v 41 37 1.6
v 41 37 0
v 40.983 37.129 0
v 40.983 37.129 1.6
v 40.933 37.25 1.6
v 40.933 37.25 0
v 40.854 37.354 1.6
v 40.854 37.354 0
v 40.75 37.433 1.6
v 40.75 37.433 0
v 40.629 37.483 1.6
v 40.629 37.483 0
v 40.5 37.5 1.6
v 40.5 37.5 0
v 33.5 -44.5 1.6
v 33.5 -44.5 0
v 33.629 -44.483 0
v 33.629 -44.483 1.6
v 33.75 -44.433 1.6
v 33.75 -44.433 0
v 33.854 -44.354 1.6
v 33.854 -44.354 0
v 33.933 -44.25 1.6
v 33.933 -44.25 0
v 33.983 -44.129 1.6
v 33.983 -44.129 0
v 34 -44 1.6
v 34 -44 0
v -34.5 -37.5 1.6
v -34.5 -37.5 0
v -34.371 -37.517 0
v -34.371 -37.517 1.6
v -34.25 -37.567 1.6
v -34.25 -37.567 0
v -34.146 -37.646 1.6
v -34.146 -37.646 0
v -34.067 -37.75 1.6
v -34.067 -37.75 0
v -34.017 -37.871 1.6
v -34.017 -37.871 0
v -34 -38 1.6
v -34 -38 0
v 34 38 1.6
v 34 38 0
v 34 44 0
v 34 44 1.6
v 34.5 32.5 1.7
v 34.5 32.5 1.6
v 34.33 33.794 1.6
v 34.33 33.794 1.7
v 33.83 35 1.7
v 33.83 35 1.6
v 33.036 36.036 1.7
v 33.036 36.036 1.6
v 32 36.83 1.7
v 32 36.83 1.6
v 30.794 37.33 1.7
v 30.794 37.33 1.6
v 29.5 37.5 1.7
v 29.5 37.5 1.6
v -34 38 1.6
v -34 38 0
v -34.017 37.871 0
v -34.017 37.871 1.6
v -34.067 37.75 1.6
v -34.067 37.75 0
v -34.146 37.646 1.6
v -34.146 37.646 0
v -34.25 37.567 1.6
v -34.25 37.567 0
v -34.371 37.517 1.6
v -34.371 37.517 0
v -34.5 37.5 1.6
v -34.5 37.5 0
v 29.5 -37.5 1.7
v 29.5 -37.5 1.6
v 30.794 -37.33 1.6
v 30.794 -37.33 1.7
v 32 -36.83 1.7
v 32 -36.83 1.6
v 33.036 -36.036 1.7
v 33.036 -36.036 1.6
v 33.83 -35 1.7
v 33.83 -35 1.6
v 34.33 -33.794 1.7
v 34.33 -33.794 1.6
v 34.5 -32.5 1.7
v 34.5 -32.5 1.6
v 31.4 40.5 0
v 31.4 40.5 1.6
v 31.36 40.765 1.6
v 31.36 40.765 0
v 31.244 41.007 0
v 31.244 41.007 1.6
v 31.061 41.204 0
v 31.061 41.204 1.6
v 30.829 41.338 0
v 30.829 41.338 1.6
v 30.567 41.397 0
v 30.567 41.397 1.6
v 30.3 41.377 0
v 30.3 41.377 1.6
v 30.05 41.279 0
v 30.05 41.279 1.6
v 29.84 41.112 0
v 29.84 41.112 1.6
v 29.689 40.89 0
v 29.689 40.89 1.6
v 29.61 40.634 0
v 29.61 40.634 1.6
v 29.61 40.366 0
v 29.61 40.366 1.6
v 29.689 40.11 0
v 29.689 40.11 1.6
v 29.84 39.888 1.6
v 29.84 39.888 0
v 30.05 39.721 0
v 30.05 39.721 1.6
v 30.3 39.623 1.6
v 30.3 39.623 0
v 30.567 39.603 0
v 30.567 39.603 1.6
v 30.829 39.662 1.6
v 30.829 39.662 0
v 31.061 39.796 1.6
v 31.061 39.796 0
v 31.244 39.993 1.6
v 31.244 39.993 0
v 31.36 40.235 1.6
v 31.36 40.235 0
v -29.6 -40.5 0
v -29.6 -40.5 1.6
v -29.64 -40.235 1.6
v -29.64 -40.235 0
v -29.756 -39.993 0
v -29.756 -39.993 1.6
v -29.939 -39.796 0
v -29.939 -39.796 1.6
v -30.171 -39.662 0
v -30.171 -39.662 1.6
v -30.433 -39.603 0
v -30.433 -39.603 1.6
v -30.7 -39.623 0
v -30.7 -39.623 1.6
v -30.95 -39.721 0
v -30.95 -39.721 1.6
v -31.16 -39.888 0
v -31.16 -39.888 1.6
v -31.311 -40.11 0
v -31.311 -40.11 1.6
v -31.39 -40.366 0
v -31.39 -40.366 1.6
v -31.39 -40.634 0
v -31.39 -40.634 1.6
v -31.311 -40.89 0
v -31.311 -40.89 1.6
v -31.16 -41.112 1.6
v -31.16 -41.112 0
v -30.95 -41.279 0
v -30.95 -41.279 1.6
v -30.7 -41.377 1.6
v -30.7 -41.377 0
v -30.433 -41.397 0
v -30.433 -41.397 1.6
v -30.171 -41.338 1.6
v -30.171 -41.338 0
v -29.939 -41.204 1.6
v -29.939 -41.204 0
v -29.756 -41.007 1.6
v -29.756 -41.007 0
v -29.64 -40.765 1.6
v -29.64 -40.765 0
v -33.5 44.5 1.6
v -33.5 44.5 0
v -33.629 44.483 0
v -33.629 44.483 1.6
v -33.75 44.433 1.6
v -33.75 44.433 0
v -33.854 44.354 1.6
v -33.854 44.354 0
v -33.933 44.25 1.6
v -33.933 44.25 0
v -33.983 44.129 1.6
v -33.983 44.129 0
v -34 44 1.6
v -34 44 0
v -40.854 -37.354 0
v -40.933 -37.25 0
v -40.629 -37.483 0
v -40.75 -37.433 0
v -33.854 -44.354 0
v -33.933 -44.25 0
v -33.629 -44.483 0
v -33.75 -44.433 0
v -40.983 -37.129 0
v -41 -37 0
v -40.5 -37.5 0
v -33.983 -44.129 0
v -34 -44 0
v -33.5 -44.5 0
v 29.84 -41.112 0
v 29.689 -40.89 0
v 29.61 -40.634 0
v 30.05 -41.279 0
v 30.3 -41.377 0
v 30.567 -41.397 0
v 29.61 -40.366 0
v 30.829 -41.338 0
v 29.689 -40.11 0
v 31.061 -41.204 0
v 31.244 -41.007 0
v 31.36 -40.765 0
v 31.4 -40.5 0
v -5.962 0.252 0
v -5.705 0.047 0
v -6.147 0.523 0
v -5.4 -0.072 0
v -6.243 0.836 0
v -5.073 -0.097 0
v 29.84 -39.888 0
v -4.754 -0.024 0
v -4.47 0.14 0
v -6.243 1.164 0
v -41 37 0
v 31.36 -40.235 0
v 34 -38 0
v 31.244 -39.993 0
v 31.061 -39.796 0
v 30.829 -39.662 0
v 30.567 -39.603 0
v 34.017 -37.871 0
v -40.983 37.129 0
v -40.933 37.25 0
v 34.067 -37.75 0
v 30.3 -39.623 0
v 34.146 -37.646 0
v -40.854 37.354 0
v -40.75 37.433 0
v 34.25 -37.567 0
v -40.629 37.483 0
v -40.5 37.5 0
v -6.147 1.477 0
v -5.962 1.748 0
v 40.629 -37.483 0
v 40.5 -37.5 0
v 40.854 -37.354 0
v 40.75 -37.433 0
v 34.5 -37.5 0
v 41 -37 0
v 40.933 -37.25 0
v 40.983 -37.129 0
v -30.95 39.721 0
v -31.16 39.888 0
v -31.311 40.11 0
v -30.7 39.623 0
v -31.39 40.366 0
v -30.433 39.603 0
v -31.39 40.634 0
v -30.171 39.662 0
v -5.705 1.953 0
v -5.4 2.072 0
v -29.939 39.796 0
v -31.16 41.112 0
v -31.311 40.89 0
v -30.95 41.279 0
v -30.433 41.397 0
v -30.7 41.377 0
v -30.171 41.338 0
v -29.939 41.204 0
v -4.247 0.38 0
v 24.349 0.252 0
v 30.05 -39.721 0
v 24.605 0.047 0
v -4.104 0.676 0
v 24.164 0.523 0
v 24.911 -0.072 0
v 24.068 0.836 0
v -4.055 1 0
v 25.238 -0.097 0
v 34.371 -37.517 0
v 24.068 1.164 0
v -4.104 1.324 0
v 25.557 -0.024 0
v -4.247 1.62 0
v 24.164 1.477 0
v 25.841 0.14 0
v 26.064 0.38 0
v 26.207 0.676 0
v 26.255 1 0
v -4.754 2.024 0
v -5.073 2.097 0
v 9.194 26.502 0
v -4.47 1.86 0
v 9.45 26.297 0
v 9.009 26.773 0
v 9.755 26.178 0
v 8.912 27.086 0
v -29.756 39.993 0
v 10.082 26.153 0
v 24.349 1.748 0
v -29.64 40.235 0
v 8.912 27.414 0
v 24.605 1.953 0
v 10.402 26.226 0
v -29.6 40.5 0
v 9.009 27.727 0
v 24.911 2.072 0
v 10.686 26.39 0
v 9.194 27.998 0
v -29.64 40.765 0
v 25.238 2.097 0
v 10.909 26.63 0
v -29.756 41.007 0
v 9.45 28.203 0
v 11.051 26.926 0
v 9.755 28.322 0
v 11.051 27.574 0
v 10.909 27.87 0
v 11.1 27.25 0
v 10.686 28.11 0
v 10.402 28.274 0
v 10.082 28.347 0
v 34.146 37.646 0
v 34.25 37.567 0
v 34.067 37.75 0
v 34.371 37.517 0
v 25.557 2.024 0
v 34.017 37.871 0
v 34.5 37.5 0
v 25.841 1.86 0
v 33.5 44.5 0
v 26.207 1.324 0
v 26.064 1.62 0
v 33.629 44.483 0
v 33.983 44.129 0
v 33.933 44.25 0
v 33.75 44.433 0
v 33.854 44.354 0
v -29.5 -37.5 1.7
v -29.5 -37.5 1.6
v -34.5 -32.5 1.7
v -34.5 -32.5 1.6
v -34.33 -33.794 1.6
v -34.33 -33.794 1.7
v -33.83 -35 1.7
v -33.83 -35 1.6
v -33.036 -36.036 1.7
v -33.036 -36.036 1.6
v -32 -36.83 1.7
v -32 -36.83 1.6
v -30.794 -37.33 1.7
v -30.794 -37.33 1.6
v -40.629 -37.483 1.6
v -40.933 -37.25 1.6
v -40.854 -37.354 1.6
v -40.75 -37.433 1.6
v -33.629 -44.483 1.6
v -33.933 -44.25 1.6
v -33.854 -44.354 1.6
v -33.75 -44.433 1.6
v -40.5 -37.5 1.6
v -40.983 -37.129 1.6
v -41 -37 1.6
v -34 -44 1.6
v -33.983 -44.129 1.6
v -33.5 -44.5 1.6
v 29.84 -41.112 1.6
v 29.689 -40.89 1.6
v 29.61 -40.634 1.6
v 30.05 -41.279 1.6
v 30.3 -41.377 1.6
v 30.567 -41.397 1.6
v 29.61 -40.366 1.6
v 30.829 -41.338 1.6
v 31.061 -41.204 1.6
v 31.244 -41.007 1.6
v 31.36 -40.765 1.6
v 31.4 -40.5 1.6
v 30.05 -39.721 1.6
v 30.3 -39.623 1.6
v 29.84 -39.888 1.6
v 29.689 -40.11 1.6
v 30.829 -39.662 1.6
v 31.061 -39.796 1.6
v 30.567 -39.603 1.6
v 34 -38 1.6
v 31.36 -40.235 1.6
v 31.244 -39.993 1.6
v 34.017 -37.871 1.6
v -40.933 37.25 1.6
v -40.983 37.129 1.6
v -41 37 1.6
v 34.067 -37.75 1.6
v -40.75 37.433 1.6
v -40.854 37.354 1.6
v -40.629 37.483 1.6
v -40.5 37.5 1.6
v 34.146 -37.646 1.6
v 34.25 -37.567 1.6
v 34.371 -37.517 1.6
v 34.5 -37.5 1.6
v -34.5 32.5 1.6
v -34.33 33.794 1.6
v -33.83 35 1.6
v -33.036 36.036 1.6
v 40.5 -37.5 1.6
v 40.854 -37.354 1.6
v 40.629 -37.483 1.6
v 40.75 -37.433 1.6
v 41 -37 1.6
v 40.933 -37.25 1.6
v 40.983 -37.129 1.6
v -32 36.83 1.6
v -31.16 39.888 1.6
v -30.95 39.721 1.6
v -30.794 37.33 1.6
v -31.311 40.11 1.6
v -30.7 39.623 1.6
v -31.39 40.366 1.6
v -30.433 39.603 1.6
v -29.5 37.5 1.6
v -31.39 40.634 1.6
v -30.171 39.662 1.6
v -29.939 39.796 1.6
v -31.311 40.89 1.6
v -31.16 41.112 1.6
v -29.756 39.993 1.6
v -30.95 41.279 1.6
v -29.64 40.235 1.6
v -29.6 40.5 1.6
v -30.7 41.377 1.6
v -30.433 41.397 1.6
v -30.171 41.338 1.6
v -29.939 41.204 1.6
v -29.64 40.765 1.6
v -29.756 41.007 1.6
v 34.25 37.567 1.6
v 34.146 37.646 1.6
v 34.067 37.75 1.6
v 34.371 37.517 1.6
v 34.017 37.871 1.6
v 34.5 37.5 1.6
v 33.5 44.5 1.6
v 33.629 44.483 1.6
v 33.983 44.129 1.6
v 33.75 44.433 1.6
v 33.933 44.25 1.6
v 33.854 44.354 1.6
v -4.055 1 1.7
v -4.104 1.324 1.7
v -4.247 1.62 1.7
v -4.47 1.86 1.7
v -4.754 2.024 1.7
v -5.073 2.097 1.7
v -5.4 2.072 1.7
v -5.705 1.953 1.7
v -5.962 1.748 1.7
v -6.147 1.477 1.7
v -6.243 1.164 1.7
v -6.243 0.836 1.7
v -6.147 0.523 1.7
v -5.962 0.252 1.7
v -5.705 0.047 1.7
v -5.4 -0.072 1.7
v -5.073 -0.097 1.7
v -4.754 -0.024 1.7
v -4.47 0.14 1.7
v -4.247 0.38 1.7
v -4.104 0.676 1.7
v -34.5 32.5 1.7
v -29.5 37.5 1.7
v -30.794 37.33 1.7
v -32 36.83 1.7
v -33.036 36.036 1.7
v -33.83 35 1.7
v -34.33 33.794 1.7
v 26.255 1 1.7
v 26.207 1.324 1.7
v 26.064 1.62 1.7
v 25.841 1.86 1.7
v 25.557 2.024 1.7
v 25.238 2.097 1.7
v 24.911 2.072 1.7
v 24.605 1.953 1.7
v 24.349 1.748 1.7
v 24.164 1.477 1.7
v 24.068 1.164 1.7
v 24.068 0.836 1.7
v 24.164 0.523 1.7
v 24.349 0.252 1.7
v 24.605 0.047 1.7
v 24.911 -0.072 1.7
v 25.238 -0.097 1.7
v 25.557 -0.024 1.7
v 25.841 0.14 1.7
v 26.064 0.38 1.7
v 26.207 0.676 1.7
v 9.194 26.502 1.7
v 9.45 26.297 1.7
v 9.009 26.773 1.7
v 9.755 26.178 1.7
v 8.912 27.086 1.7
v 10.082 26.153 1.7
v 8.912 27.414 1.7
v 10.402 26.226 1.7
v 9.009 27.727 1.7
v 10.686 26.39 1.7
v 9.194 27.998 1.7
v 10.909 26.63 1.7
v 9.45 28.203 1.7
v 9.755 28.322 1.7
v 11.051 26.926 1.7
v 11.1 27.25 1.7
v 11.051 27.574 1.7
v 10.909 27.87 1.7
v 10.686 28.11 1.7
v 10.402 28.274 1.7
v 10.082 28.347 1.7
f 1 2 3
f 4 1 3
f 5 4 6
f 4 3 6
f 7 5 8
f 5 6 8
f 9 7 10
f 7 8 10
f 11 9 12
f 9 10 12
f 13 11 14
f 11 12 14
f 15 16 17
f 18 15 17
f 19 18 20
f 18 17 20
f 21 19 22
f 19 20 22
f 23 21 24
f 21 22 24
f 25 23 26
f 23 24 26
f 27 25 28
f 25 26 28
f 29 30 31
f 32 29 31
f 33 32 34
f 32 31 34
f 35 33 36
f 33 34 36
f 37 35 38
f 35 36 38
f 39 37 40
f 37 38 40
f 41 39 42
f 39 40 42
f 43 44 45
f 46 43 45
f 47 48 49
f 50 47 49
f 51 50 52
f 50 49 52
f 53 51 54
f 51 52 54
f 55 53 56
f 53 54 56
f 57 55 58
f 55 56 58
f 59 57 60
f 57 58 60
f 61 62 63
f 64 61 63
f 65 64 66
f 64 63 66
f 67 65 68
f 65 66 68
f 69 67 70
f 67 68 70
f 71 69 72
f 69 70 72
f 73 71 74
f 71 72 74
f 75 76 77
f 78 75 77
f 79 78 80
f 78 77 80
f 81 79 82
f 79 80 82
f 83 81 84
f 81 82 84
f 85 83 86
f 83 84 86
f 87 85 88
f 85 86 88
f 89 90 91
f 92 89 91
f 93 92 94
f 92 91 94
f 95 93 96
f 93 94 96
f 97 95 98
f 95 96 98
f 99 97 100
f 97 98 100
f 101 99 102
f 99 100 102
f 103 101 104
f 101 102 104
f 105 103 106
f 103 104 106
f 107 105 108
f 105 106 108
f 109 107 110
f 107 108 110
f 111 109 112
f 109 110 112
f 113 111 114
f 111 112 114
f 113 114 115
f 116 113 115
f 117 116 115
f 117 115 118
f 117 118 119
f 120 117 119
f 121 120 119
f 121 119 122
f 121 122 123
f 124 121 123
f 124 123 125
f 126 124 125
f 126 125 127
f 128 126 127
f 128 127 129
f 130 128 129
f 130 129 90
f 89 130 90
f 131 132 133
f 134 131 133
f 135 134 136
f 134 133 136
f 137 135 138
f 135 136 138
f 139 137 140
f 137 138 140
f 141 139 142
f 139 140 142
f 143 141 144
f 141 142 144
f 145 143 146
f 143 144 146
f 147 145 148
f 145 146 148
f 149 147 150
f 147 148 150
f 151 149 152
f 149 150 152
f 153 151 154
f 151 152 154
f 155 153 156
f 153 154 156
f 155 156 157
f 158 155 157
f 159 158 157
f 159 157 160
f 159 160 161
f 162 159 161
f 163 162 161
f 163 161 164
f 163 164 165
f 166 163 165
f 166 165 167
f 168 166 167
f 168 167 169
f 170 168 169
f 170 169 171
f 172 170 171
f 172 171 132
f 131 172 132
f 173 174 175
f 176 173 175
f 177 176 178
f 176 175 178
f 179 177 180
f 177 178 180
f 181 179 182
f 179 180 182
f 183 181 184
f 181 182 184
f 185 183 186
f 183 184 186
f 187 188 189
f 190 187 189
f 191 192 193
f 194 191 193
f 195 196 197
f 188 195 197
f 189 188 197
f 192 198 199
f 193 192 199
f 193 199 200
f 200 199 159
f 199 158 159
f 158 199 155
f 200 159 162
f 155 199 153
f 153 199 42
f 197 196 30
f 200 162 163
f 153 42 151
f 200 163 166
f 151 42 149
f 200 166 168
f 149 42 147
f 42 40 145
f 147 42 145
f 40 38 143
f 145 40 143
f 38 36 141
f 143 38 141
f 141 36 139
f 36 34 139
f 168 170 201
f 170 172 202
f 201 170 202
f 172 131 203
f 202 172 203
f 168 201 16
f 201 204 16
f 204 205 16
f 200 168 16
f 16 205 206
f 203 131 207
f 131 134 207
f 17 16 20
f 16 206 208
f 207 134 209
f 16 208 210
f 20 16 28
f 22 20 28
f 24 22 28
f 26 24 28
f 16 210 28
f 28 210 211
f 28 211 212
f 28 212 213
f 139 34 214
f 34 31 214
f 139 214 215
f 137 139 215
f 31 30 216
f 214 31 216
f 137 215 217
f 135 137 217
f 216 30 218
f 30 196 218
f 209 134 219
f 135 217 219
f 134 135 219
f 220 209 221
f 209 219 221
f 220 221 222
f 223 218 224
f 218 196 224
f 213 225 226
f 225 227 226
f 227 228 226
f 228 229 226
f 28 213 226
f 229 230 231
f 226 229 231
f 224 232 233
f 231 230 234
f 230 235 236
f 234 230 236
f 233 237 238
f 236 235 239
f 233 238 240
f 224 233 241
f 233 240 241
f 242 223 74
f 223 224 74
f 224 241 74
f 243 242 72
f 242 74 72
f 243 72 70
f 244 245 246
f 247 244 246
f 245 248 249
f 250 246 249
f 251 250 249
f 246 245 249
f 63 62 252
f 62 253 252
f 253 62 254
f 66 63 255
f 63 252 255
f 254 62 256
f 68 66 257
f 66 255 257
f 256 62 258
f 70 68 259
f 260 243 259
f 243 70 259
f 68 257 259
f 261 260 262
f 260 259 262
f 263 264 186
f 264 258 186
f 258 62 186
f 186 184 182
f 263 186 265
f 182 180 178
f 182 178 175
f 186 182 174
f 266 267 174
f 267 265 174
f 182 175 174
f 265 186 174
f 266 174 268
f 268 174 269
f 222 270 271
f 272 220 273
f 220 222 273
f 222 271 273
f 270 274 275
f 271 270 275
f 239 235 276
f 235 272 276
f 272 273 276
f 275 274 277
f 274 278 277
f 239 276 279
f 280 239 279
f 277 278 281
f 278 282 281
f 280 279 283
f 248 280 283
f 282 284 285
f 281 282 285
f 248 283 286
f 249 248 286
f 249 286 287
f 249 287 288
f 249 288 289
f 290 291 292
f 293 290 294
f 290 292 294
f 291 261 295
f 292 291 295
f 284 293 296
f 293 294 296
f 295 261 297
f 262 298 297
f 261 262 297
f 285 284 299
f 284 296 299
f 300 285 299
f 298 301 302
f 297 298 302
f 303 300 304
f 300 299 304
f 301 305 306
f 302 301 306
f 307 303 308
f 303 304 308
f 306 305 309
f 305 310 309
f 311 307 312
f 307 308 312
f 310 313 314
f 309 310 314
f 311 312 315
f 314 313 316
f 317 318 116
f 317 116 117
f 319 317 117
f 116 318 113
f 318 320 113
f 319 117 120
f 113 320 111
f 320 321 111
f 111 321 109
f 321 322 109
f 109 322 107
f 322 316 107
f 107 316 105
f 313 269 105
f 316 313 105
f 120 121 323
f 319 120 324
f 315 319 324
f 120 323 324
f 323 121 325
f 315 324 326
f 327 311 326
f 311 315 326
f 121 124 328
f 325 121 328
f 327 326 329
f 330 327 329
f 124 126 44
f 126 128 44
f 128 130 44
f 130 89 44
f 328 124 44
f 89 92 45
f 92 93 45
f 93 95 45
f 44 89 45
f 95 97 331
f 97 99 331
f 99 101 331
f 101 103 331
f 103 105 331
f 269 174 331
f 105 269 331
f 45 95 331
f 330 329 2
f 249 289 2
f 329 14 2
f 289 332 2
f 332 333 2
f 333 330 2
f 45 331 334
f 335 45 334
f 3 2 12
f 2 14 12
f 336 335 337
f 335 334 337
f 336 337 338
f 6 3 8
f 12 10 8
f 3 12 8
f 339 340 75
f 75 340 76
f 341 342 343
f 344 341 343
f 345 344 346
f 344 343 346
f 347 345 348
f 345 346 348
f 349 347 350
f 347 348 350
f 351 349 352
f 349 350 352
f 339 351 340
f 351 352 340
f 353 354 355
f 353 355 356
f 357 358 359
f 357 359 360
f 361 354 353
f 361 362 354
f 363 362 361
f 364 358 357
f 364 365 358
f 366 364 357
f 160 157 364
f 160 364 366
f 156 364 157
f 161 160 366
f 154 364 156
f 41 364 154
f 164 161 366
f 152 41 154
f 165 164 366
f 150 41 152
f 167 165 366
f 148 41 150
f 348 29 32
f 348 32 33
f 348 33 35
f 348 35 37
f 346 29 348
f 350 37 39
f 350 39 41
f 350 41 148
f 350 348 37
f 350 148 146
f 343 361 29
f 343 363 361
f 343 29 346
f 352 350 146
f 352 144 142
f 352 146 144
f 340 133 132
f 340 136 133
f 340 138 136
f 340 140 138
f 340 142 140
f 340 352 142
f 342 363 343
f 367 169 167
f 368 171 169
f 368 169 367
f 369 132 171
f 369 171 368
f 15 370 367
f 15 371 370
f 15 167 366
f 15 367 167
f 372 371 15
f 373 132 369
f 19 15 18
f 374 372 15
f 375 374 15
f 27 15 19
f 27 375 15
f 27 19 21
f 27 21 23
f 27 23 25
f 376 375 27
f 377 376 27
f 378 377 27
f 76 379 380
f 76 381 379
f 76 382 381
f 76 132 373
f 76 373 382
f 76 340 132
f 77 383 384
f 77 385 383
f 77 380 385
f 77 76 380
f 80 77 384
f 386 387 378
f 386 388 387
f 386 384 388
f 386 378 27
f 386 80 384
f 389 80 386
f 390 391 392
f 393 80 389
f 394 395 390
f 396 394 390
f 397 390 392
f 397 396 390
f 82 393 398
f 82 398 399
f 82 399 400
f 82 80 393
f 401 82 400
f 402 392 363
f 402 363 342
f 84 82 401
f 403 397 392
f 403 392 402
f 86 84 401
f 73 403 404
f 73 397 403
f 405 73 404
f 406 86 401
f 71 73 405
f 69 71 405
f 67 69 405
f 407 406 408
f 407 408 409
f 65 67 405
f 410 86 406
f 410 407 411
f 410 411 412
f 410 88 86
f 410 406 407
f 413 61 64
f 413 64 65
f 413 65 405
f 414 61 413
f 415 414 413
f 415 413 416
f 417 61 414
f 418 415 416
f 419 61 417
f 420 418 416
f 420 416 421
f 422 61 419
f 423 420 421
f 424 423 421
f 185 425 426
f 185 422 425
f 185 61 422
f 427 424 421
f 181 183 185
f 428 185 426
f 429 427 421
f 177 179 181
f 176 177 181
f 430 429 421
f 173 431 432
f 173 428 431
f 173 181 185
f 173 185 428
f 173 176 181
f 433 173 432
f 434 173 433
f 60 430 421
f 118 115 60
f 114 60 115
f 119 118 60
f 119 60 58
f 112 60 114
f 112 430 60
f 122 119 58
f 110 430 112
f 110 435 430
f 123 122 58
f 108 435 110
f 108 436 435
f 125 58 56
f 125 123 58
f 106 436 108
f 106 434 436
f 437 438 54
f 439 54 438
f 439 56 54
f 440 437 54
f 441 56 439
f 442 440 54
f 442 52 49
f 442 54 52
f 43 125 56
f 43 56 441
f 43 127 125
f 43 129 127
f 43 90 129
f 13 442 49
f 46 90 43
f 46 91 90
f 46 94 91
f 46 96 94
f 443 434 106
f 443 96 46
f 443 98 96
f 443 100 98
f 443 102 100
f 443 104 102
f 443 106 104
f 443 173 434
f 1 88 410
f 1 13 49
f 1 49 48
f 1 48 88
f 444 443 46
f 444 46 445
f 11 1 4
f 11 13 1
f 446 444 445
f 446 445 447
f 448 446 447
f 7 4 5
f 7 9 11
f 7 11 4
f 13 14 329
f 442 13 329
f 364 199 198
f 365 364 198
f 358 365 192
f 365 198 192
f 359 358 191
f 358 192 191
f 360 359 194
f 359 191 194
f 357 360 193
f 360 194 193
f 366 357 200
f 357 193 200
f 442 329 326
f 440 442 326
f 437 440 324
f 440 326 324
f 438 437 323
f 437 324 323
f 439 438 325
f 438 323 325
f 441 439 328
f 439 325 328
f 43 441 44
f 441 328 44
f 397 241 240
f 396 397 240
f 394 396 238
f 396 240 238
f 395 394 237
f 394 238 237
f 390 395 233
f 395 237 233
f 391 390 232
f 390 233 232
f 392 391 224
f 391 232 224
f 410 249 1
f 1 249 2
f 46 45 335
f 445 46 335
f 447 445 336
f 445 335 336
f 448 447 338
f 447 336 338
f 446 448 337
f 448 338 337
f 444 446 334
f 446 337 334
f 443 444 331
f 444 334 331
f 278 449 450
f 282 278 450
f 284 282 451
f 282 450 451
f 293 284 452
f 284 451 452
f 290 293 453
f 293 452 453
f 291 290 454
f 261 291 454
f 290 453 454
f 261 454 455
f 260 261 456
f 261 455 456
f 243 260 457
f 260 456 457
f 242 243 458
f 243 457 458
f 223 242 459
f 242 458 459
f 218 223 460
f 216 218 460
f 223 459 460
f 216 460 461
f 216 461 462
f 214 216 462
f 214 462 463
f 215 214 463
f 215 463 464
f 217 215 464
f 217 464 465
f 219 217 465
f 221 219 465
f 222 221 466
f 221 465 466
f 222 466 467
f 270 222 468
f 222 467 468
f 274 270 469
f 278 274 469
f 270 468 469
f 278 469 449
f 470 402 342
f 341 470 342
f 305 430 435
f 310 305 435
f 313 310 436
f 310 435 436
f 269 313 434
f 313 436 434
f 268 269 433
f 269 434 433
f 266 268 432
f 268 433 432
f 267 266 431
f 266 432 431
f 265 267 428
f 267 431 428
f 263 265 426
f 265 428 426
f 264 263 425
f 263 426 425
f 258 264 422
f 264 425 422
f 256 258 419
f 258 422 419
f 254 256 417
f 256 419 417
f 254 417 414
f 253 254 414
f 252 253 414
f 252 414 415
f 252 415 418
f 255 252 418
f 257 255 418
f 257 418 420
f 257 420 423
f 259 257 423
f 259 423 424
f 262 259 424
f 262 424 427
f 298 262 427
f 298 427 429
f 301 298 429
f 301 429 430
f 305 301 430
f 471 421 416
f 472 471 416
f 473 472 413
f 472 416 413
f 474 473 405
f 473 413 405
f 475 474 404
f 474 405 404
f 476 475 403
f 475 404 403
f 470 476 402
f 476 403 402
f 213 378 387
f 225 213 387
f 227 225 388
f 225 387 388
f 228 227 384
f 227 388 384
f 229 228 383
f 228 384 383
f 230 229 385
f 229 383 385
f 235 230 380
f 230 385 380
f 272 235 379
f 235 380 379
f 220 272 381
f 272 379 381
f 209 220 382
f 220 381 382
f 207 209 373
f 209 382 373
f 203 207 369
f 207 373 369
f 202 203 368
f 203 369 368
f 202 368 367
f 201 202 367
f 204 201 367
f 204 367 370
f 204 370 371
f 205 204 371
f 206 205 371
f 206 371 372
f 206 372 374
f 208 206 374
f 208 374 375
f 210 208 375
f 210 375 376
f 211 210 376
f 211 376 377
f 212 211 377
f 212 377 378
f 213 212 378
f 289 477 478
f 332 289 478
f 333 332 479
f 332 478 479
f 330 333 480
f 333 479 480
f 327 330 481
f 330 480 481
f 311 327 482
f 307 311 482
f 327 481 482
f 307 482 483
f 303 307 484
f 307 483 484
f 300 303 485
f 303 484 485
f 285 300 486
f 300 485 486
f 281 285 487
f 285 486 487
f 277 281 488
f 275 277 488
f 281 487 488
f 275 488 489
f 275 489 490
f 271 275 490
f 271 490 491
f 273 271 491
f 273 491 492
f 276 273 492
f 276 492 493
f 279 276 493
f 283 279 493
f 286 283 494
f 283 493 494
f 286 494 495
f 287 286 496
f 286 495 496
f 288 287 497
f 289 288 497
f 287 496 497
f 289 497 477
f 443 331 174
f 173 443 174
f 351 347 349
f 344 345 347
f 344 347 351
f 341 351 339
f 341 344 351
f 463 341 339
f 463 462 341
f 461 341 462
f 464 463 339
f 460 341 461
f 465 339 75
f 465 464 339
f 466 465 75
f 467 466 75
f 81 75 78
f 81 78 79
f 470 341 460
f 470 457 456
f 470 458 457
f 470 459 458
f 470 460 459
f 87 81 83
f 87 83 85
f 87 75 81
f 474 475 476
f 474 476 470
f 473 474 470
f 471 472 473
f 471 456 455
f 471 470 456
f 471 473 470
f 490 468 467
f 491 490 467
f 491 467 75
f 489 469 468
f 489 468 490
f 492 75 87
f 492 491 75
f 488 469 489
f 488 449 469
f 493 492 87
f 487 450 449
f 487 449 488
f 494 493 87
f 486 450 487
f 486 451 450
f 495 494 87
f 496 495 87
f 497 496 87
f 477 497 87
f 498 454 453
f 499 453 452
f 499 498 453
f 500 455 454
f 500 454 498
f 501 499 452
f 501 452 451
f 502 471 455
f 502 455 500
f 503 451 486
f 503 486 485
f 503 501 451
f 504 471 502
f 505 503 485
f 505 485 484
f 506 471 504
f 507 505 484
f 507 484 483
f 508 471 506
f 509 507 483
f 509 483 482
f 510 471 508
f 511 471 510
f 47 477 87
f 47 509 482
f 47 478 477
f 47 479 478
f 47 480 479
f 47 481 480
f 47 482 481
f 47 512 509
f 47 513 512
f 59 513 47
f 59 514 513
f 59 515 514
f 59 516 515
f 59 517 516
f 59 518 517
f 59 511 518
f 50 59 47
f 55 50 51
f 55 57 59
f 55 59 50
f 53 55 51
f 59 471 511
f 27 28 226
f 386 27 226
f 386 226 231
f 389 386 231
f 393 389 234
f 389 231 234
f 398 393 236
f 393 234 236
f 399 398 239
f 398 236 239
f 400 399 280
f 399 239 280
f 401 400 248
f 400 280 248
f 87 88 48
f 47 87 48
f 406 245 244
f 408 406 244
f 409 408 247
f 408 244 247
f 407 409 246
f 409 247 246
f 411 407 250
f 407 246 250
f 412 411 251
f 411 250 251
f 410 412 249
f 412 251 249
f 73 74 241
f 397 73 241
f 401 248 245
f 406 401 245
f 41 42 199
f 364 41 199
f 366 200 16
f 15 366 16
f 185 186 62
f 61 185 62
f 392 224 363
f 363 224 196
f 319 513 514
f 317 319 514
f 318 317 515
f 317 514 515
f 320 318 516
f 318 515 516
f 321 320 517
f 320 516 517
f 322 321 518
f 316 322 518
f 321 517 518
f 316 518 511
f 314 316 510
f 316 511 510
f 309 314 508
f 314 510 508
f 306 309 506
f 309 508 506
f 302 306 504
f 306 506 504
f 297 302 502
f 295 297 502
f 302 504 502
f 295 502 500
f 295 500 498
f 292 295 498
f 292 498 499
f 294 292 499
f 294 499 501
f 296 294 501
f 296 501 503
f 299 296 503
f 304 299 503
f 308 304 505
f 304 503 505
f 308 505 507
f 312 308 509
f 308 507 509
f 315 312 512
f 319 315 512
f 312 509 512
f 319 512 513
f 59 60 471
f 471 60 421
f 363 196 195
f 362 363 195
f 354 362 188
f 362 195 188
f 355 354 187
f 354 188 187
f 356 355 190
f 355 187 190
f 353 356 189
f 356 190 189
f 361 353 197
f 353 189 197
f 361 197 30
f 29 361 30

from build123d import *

# Parameters (mm, degrees)
BOSS_EXTRUDE1_DEPTH              = 1.6
BOSS_EXTRUDE2_DEPTH              = 0.1
M1_6_HOLE1_FIXINGSTRUCTURE_D     = 1.8
M1_6_HOLE1_FIXINGSTRUCTURE_DEPTH = 200
M1_6_HOLE1_FIXINGSTRUCTURE_TIP   = 0.540774557
SKETCH4_R                        = 1.1
CUT_EXTRUDE1_DEPTH               = 1.7


with BuildPart() as part:
    # Sketch1 → Boss-Extrude1 (new body)
    with BuildSketch(Plane.XY):
        with BuildLine():
            Line((-34, 44), (-34, 38))
            ThreePointArc((-34, 38), (-34.146446609, 37.646446609), (-34.5, 37.5))
            Line((-34.5, 37.5), (-40.5, 37.5))
            ThreePointArc((-40.5, 37.5), (-40.853553391, 37.353553391), (-41, 37))
            Line((-41, 37), (-41, -37))
            ThreePointArc((-41, -37), (-40.853553391, -37.353553391), (-40.5, -37.5))
            Line((-40.5, -37.5), (-34.5, -37.5))
            ThreePointArc((-34.5, -37.5), (-34.146446609, -37.646446609), (-34, -38))
            Line((-34, -38), (-34, -44))
            ThreePointArc((-34, -44), (-33.853553391, -44.353553391), (-33.5, -44.5))
            Line((-33.5, -44.5), (33.5, -44.5))
            ThreePointArc((33.5, -44.5), (33.853553391, -44.353553391), (34, -44))
            Line((34, -44), (34, -38))
            ThreePointArc((34, -38), (34.146446609, -37.646446609), (34.5, -37.5))
            Line((34.5, -37.5), (40.5, -37.5))
            ThreePointArc((40.5, -37.5), (40.853553391, -37.353553391), (41, -37))
            Line((41, -37), (41, 37))
            ThreePointArc((41, 37), (40.853553391, 37.353553391), (40.5, 37.5))
            Line((40.5, 37.5), (34.5, 37.5))
            ThreePointArc((34.5, 37.5), (34.146446609, 37.646446609), (34, 38))
            Line((34, 38), (34, 44))
            ThreePointArc((34, 44), (33.853553391, 44.353553391), (33.5, 44.5))
            Line((33.5, 44.5), (-33.5, 44.5))
            ThreePointArc((-33.5, 44.5), (-33.853553391, 44.353553391), (-34, 44))
        make_face()
    extrude(amount=BOSS_EXTRUDE1_DEPTH)

    # Esboço1 → Boss-Extrude2 (add)
    with BuildSketch(Plane.XY.offset(1.6)):
        with BuildLine():
            Line((-29.5, -37.5), (29.5, -37.5))
            ThreePointArc((29.5, -37.5), (33.035533906, -36.035533906), (34.5, -32.5))
            Line((34.5, -32.5), (34.5, 32.5))
            ThreePointArc((34.5, 32.5), (33.035533906, 36.035533906), (29.5, 37.5))
            Line((29.5, 37.5), (-29.5, 37.5))
            ThreePointArc((-29.5, 37.5), (-33.035533906, 36.035533906), (-34.5, 32.5))
            Line((-34.5, 32.5), (-34.5, -32.5))
            ThreePointArc((-34.5, -32.5), (-33.035533906, -36.035533906), (-29.5, -37.5))
        make_face()
    extrude(amount=BOSS_EXTRUDE2_DEPTH)

    # M1.6 Hole1-FixingStructure
    with Locations(Plane(origin=(0, 0, 0), x_dir=(-1, 0, 0), z_dir=(0, 0, -1))):
        with Locations((-30.5, 40.5), (30.5, 40.5), (-30.5, -40.5), (30.5, -40.5)):
            Hole(M1_6_HOLE1_FIXINGSTRUCTURE_D / 2, depth=M1_6_HOLE1_FIXINGSTRUCTURE_DEPTH)
            with Locations((0, 0, -(M1_6_HOLE1_FIXINGSTRUCTURE_DEPTH + M1_6_HOLE1_FIXINGSTRUCTURE_TIP / 2))):  # 118° drill point
                Cone(0, M1_6_HOLE1_FIXINGSTRUCTURE_D / 2, M1_6_HOLE1_FIXINGSTRUCTURE_TIP, mode=Mode.SUBTRACT)

    # Sketch4 → Cut-Extrude1 (cut)
    with BuildSketch(Plane.XY.offset(1.7)):
        with Locations((25.155444566, 1)):
            Circle(SKETCH4_R)
        with Locations((10, 27.25)):
            Circle(SKETCH4_R)
        with Locations((-5.155444566, 1)):
            Circle(SKETCH4_R)
    extrude(amount=-CUT_EXTRUDE1_DEPTH, mode=Mode.SUBTRACT)


solid = part.part
